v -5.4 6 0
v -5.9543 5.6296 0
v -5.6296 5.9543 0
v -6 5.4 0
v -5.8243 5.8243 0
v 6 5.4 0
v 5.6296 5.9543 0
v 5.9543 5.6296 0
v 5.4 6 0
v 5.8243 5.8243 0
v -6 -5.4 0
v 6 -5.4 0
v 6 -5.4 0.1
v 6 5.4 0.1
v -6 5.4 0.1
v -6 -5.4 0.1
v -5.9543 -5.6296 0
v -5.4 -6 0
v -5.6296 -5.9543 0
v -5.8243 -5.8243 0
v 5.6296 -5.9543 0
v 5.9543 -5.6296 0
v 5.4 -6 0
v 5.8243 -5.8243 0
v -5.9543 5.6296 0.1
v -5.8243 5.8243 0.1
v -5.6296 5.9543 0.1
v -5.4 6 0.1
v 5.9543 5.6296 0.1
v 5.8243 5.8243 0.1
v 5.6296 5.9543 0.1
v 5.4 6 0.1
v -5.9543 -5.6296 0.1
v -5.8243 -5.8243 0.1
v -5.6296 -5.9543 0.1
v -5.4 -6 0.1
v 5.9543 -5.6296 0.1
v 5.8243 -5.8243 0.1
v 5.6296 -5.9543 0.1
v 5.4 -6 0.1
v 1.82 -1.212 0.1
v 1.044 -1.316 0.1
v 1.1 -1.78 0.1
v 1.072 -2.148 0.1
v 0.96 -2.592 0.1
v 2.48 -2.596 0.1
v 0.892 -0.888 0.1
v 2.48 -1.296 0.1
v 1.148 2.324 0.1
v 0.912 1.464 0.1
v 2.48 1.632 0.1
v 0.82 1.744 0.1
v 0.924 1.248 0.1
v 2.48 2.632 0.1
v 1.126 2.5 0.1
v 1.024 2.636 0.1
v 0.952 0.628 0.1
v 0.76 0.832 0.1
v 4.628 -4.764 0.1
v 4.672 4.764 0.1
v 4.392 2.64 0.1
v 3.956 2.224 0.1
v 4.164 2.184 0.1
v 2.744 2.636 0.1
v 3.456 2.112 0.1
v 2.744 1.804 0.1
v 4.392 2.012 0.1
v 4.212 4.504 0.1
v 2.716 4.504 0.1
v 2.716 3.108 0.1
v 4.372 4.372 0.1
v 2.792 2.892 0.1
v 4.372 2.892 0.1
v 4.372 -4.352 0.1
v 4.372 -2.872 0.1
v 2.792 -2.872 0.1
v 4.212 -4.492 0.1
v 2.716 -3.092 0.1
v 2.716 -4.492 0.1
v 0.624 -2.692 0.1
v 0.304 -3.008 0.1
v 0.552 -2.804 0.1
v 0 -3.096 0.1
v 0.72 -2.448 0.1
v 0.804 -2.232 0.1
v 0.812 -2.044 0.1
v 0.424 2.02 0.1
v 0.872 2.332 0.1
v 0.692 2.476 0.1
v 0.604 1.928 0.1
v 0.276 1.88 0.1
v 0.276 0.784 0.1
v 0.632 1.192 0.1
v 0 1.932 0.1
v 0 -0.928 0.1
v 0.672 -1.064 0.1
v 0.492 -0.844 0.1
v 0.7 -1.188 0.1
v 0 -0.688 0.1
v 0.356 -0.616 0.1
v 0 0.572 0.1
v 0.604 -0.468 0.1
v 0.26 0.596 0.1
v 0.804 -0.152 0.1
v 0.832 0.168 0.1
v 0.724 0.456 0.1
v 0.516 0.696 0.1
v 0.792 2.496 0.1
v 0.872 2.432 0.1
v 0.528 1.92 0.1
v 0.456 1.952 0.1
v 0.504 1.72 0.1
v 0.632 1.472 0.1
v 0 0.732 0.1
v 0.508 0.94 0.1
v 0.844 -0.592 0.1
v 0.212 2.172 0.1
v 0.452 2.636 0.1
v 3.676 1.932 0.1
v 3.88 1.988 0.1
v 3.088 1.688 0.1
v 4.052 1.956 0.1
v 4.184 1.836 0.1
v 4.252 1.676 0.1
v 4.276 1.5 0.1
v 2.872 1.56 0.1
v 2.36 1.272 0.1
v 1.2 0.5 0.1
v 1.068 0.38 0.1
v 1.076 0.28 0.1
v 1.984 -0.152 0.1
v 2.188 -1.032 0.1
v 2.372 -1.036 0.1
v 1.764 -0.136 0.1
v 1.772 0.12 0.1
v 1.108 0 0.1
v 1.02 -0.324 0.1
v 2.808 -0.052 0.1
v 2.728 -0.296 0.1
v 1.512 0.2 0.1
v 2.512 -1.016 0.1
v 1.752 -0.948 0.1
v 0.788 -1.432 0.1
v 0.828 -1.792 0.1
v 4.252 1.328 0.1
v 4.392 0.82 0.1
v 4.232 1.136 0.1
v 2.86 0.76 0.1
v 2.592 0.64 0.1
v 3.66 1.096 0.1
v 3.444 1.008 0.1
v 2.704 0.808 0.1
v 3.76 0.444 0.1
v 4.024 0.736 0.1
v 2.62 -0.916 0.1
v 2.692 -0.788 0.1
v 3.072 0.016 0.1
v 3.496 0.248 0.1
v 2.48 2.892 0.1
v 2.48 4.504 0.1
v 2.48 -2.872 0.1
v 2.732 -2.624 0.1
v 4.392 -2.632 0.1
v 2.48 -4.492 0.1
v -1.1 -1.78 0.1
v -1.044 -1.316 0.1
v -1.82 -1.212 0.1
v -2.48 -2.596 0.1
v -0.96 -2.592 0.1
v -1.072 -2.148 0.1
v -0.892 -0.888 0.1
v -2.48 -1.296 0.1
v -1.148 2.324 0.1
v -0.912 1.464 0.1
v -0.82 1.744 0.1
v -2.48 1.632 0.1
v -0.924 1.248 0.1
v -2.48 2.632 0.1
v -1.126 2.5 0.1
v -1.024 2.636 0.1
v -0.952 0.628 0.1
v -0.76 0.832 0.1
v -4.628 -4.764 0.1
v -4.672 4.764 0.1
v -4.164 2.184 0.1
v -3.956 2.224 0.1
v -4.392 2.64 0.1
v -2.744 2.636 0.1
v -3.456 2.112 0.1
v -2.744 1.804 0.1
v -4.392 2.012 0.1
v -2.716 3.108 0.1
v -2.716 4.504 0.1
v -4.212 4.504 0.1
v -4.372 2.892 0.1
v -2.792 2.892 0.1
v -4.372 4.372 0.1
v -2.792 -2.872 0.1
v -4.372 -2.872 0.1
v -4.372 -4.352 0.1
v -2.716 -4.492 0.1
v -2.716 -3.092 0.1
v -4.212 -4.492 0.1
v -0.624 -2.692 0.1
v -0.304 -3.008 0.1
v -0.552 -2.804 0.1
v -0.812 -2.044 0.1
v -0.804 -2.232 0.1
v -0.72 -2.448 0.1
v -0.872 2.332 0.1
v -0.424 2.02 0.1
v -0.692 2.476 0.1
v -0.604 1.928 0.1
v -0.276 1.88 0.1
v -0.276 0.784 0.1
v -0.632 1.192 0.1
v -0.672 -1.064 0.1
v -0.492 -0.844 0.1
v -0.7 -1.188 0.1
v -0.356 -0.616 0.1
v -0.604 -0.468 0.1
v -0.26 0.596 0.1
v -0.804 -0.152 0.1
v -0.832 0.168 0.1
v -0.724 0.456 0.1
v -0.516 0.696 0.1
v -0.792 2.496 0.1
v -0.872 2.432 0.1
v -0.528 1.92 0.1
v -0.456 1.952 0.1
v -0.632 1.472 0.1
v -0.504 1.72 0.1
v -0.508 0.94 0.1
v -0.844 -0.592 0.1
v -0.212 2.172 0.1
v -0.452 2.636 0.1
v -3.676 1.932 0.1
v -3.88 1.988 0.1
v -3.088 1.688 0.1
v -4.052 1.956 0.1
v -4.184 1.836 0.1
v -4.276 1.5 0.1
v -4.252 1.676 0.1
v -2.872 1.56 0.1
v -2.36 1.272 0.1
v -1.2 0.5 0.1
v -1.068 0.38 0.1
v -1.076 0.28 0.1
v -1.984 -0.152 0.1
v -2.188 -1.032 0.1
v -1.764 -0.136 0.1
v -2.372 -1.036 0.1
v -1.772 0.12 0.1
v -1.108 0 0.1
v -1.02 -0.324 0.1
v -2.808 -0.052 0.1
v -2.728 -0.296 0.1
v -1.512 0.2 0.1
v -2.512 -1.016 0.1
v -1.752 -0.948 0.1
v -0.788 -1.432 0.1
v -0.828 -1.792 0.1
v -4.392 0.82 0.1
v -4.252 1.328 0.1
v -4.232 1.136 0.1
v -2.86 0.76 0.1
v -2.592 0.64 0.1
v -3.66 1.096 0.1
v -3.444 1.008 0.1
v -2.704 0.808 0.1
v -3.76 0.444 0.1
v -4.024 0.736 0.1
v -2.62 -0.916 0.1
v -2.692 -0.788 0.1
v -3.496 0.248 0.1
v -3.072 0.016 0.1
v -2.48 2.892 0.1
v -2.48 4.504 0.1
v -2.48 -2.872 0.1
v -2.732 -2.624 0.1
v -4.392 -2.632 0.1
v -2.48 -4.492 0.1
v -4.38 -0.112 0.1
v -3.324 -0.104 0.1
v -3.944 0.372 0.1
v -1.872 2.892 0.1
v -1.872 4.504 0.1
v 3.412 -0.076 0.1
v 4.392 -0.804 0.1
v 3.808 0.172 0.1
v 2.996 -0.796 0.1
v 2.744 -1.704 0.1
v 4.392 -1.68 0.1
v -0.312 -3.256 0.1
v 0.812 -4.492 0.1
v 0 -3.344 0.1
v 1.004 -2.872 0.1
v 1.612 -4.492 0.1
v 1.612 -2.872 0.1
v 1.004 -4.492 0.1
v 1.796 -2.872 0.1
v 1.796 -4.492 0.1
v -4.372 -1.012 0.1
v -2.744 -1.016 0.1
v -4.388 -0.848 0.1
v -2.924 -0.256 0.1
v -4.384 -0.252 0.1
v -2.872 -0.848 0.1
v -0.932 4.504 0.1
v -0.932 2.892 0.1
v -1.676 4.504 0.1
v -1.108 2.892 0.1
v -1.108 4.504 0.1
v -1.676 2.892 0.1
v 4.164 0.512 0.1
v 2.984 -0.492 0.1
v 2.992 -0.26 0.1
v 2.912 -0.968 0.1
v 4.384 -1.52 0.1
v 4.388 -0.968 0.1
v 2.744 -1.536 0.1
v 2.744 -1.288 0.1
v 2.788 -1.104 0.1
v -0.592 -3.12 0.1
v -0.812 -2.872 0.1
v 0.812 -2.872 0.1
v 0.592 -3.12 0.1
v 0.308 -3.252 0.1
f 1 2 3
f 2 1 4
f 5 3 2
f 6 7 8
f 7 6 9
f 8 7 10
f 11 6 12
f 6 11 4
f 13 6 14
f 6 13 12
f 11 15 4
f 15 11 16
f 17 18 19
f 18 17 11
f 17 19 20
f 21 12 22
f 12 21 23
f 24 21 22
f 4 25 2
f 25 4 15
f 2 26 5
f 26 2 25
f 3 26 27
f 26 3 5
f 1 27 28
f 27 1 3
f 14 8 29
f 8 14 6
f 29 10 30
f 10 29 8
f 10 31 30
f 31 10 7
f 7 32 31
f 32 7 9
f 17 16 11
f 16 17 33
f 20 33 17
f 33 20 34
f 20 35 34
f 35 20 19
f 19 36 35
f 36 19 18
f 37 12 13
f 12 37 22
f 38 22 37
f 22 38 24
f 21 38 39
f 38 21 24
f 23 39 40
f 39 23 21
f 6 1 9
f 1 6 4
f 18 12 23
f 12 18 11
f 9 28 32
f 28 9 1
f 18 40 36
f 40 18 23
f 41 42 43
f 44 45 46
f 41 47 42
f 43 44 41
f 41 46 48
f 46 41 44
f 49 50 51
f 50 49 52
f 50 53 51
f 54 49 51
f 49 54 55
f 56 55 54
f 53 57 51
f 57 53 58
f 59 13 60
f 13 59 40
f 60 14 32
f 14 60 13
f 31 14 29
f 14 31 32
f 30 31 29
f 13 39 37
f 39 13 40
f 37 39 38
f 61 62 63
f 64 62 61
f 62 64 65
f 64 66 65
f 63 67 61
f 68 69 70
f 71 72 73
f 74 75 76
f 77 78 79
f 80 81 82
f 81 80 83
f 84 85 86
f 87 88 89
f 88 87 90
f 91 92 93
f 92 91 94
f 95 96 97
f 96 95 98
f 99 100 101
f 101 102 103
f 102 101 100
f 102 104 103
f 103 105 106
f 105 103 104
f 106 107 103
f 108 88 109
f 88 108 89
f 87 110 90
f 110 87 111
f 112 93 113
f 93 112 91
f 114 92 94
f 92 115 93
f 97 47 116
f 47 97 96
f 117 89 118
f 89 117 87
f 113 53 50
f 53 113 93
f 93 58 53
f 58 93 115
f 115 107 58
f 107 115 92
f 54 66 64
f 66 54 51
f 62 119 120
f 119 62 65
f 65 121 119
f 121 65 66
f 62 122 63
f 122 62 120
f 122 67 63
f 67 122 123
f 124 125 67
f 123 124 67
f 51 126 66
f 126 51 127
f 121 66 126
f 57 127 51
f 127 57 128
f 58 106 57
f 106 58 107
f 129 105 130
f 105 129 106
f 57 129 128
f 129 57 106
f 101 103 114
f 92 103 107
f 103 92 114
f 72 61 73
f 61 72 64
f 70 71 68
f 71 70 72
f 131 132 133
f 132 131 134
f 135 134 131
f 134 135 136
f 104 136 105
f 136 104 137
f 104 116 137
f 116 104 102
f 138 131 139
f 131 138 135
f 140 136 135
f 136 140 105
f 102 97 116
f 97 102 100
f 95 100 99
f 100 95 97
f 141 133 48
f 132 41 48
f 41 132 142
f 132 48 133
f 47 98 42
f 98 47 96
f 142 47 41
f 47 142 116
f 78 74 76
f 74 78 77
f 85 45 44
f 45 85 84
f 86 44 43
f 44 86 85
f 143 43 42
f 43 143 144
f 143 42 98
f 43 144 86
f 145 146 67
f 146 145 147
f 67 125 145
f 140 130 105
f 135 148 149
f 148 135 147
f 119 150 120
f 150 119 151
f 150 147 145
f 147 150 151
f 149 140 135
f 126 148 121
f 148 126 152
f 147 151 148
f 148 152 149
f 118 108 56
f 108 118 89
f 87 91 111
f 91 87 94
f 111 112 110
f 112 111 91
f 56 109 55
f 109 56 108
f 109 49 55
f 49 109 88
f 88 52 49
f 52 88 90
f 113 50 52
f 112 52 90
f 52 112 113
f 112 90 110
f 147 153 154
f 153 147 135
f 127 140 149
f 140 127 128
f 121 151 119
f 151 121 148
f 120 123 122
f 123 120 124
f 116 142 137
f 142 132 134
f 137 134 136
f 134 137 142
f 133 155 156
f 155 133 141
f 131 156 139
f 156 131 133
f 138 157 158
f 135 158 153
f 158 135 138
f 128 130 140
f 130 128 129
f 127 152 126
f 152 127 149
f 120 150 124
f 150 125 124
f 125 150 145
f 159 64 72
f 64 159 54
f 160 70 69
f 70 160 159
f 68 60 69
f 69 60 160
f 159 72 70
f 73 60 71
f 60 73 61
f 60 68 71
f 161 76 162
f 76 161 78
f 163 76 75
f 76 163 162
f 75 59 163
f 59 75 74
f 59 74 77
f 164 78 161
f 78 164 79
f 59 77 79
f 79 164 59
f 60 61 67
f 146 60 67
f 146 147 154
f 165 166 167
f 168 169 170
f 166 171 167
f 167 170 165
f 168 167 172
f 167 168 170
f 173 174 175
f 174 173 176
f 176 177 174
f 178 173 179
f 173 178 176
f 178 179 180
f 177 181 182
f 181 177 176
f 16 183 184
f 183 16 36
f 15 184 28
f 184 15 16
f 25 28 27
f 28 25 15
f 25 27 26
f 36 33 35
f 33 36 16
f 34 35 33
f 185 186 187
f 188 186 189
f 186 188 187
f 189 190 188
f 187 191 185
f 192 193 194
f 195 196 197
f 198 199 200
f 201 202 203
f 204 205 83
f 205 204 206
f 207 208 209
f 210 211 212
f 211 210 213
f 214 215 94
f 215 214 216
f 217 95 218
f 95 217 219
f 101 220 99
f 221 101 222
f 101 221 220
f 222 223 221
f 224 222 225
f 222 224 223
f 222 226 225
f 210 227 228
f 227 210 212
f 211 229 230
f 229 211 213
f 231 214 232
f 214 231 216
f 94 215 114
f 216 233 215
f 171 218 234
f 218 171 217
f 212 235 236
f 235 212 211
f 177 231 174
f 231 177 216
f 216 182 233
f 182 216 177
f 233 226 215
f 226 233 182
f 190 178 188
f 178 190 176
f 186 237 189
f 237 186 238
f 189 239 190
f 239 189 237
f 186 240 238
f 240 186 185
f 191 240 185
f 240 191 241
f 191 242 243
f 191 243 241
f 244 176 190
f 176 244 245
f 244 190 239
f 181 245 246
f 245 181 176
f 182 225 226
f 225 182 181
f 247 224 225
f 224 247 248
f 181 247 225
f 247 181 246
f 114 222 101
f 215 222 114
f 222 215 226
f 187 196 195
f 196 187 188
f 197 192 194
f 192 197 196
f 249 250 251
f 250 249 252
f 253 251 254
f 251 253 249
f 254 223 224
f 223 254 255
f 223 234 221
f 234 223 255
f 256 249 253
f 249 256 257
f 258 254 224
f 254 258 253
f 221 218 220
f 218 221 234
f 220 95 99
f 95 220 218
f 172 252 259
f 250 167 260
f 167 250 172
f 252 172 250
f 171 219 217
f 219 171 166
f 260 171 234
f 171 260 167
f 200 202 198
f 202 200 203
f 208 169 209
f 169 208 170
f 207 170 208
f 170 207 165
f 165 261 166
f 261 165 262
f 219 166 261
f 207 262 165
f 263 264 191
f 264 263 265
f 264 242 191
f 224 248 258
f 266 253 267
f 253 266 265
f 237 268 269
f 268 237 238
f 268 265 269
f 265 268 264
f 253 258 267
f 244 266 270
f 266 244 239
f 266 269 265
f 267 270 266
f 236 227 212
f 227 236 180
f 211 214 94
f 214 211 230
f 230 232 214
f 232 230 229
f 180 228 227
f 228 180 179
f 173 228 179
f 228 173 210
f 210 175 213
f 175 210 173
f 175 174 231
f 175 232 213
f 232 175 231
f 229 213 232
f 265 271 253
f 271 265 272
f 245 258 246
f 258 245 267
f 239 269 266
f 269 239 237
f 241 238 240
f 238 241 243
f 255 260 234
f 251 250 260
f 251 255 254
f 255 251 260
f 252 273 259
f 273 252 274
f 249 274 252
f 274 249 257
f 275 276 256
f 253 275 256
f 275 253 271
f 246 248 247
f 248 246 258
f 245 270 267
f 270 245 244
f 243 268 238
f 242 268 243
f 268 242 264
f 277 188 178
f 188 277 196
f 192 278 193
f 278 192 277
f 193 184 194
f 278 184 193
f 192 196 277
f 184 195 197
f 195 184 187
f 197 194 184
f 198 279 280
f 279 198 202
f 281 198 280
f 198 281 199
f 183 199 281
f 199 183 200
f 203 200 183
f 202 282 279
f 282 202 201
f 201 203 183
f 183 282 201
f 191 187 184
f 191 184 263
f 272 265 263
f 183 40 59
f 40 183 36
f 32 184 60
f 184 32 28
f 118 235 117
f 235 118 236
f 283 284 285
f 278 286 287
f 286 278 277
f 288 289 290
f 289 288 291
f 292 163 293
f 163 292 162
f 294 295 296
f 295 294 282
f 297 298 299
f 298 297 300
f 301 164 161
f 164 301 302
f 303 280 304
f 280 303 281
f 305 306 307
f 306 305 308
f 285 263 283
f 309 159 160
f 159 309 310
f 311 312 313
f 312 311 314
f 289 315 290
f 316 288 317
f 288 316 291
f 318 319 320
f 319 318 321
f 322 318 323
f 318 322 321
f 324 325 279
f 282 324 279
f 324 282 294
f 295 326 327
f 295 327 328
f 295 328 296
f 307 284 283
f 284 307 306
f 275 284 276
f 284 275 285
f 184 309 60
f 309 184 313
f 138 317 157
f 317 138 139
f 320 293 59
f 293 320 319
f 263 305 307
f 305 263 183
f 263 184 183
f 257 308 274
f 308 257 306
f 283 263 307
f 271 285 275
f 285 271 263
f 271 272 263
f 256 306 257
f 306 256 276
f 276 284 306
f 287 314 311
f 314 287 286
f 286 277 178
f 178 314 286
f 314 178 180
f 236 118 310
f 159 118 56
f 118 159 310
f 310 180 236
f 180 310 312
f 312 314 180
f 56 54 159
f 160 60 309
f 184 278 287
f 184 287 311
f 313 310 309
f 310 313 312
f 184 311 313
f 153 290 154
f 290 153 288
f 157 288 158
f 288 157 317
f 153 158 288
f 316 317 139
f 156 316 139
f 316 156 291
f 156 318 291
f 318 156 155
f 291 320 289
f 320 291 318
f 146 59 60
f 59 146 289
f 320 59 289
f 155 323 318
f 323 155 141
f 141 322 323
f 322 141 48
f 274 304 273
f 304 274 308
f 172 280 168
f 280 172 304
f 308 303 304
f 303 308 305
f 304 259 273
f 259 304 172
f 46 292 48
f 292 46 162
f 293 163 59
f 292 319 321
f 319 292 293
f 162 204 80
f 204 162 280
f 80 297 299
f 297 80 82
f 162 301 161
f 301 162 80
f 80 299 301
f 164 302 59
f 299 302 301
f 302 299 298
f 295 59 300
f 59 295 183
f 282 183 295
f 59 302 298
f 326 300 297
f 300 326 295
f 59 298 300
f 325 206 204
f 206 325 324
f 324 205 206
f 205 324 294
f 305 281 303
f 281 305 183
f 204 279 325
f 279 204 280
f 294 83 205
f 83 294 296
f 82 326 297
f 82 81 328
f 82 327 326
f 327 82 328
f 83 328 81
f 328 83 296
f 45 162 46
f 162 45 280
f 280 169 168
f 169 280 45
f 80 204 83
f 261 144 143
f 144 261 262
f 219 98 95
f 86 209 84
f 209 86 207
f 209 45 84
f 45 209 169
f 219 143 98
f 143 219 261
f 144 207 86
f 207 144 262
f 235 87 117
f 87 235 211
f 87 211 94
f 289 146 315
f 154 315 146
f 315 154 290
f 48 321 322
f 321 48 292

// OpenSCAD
// file: ../p/box3u12.scad
use <../lib.scad>
function ldraw_lib__box3u12() = [
// 0 Box with 3 Parallel Faces without Any Edges
// 0 Name: box3u12.dat
// 0 Author: J.C. Tchang [tchang]
// 0 !LDRAW_ORG Primitive UPDATE 2014-02
// 0 !LICENSE Licensed under CC BY 4.0 : see CAreadme.txt
// 
// 0 BFC CERTIFY CCW
  [0,"BFC","CERTIFY"],
  [0,"BFC","CCW"],
// 
// 0 !HISTORY 2014-12-23 [PTadmin] Official Update 2014-02
// 
// 
// 4 16 -1 1 1 1 1 1 1 1 -1 -1 1 -1
  [4,16,-1,1,1,1,1,1,1,1,-1,-1,1,-1],
// 4 16 -1 1 1 -1 0 1 1 0 1 1 1 1
  [4,16,-1,1,1,-1,0,1,1,0,1,1,1,1],
// 4 16 1 1 -1 1 0 -1 -1 0 -1 -1 1 -1
  [4,16,1,1,-1,1,0,-1,-1,0,-1,-1,1,-1],
];
module ldraw_lib__box3u12(step=0, col=false, unit=2/5, alt=false, line=0.2, solid=!$preview)
    makepoly(ldraw_lib__box3u12(), step=step, col=col, unit=unit, alt=alt, line=line, solid=solid);
ldraw_lib__box3u12(line=0.2);
// file: ../p/1-4cyli.scad
use <../lib.scad>
function ldraw_lib__1_4cyli() = [
// 0 Cylinder 0.25
// 0 Name: 1-4cyli.dat
// 0 Author: James Jessiman
// 0 !LDRAW_ORG Primitive UPDATE 2012-01
// 0 !LICENSE Licensed under CC BY 4.0 : see CAreadme.txt
// 
// 0 BFC CERTIFY CCW
  [0,"BFC","CERTIFY"],
  [0,"BFC","CCW"],
// 
// 0 !HISTORY 2002-03-23 [sbliss] Added BFC statement.
// 0 !HISTORY 2002-04-25 [PTadmin] Official Update 2002-02
// 0 !HISTORY 2007-06-22 [PTadmin] Header formatted for Contributor Agreement
// 0 !HISTORY 2008-07-01 [PTadmin] Official Update 2008-01
// 0 !HISTORY 2012-02-16 [Philo] Changed to CCW
// 0 !HISTORY 2012-03-30 [PTadmin] Official Update 2012-01
// 
// 
// 4 16 1 1 0 0.9239 1 0.3827 0.9239 0 0.3827 1 0 0
  [4,16,1,1,0,0.9239,1,0.3827,0.9239,0,0.3827,1,0,0],
// 5 24 1 0 0 1 1 0 0.9239 0 0.3827 1 0 -1
  [5,24,1,0,0,1,1,0,0.9239,0,0.3827,1,0,-1],
// 4 16 0.9239 1 0.3827 0.7071 1 0.7071 0.7071 0 0.7071 0.9239 0 0.3827
  [4,16,0.9239,1,0.3827,0.7071,1,0.7071,0.7071,0,0.7071,0.9239,0,0.3827],
// 5 24 0.9239 0 0.3827 0.9239 1 0.3827 0.7071 0 0.7071 1 0 0
  [5,24,0.9239,0,0.3827,0.9239,1,0.3827,0.7071,0,0.7071,1,0,0],
// 4 16 0.7071 1 0.7071 0.3827 1 0.9239 0.3827 0 0.9239 0.7071 0 0.7071
  [4,16,0.7071,1,0.7071,0.3827,1,0.9239,0.3827,0,0.9239,0.7071,0,0.7071],
// 5 24 0.7071 0 0.7071 0.7071 1 0.7071 0.3827 0 0.9239 0.9239 0 0.3827
  [5,24,0.7071,0,0.7071,0.7071,1,0.7071,0.3827,0,0.9239,0.9239,0,0.3827],
// 4 16 0.3827 1 0.9239 0 1 1 0 0 1 0.3827 0 0.9239
  [4,16,0.3827,1,0.9239,0,1,1,0,0,1,0.3827,0,0.9239],
// 5 24 0.3827 0 0.9239 0.3827 1 0.9239 0 0 1 0.7071 0 0.7071
  [5,24,0.3827,0,0.9239,0.3827,1,0.9239,0,0,1,0.7071,0,0.7071],
// 5 24 0 0 1 0 1 1 0.3827 0 0.9239 -1 0 1
  [5,24,0,0,1,0,1,1,0.3827,0,0.9239,-1,0,1],
];
module ldraw_lib__1_4cyli(step=0, col=false, unit=2/5, alt=false, line=0.2, solid=!$preview)
    makepoly(ldraw_lib__1_4cyli(), step=step, col=col, unit=unit, alt=alt, line=line, solid=solid);
ldraw_lib__1_4cyli(line=0.2);
// file: ../p/1-4chrd.scad
use <../lib.scad>
function ldraw_lib__1_4chrd() = [
// 0 Chord 0.25
// 0 Name: 1-4chrd.dat
// 0 Author: Max Martin Richter [MMR1988]
// 0 !LDRAW_ORG Primitive UPDATE 2023-05
// 0 !LICENSE Licensed under CC BY 4.0 : see CAreadme.txt
// 
// 0 BFC CERTIFY CCW
  [0,"BFC","CERTIFY"],
  [0,"BFC","CCW"],
// 
// 0 !HISTORY 2004-04-22 [PTadmin] Official Update 2004-02
// 0 !HISTORY 2007-10-09 [PTadmin] Header formatted for Contributor Agreement
// 0 !HISTORY 2008-07-01 [PTadmin] Official Update 2008-01
// 0 !HISTORY 2012-08-02 [MMR1988] Re-creation with PrimGen2 and Rectifier
// 0 !HISTORY 2012-08-09 [PTadmin] Official Update 2012-02
// 0 !HISTORY 2023-10-27 [OrionP] Change author to MMR1988 from hafhead
// 0 !HISTORY 2023-10-31 [OrionP] Official Update 2023-05
// 
// 4 16 0.9239 0 0.3827 0.3827 0 0.9239 0 0 1 1 0 0
  [4,16,0.9239,0,0.3827,0.3827,0,0.9239,0,0,1,1,0,0],
// 3 16 0.7071 0 0.7071 0.3827 0 0.9239 0.9239 0 0.3827
  [3,16,0.7071,0,0.7071,0.3827,0,0.9239,0.9239,0,0.3827],
];
module ldraw_lib__1_4chrd(step=0, col=false, unit=2/5, alt=false, line=0.2, solid=!$preview)
    makepoly(ldraw_lib__1_4chrd(), step=step, col=col, unit=unit, alt=alt, line=line, solid=solid);
ldraw_lib__1_4chrd(line=0.2);
// file: s/stickerback015x015.scad
use <../../lib.scad>
use <../../p/1-4chrd.scad>
use <../../p/1-4cyli.scad>
use <../../p/box3u12.scad>
function ldraw_lib__s__stickerback015x015() = [
// 0 ~Sticker Back  1.5 x  1.5
// 0 Name: s\stickerback015x015.dat
// 0 Author: Philippe Hurbain [Philo]
// 0 !LDRAW_ORG Subpart UPDATE 2025-11
// 0 !LICENSE Licensed under CC BY 4.0 : see CAreadme.txt
// 
// 0 BFC CERTIFY CCW
  [0,"BFC","CERTIFY"],
  [0,"BFC","CCW"],
// 
// 0 !HISTORY 2025-11-30 [OrionP] Official Update 2025-11
// 
// 1 16 -13.5 0 13.5 -1.5 0 0 0 -1 0 0 0 1.5 1-4chrd.dat
  [1,16,-13.5,0,13.5,-1.5,0,0,0,-1,0,0,0,1.5, ldraw_lib__1_4chrd()],
// 1 16 13.5 0 13.5 1.5 0 0 0 -1 0 0 0 1.5 1-4chrd.dat
  [1,16,13.5,0,13.5,1.5,0,0,0,-1,0,0,0,1.5, ldraw_lib__1_4chrd()],
// 1 16 0 -.25 0 0 0 15 0 .25 0 13.5 0 0 box3u12.dat
  [1,16,0,-.25,0,0,0,15,0,.25,0,13.5,0,0, ldraw_lib__box3u12()],
// 1 16 -13.5 0 -13.5 -1.5 0 0 0 -1 0 0 0 -1.5 1-4chrd.dat
  [1,16,-13.5,0,-13.5,-1.5,0,0,0,-1,0,0,0,-1.5, ldraw_lib__1_4chrd()],
// 1 16 13.5 0 -13.5 1.5 0 0 0 -1 0 0 0 -1.5 1-4chrd.dat
  [1,16,13.5,0,-13.5,1.5,0,0,0,-1,0,0,0,-1.5, ldraw_lib__1_4chrd()],
// 1 16 -13.5 -.25 13.5 -1.5 0 0 0 .25 0 0 0 1.5 1-4cyli.dat
  [1,16,-13.5,-.25,13.5,-1.5,0,0,0,.25,0,0,0,1.5, ldraw_lib__1_4cyli()],
// 1 16 13.5 -.25 13.5 1.5 0 0 0 .25 0 0 0 1.5 1-4cyli.dat
  [1,16,13.5,-.25,13.5,1.5,0,0,0,.25,0,0,0,1.5, ldraw_lib__1_4cyli()],
// 1 16 -13.5 -.25 -13.5 -1.5 0 0 0 .25 0 0 0 -1.5 1-4cyli.dat
  [1,16,-13.5,-.25,-13.5,-1.5,0,0,0,.25,0,0,0,-1.5, ldraw_lib__1_4cyli()],
// 1 16 13.5 -.25 -13.5 1.5 0 0 0 .25 0 0 0 -1.5 1-4cyli.dat
  [1,16,13.5,-.25,-13.5,1.5,0,0,0,.25,0,0,0,-1.5, ldraw_lib__1_4cyli()],
// 4 16 -13.5 0 15 13.5 0 15 15 0 13.5 -15 0 13.5
  [4,16,-13.5,0,15,13.5,0,15,15,0,13.5,-15,0,13.5],
// 4 16 -13.5 0 -15 -15 0 -13.5 15 0 -13.5 13.5 0 -15
  [4,16,-13.5,0,-15,-15,0,-13.5,15,0,-13.5,13.5,0,-15],
// 4 16 -13.5 -.25 15 13.5 -.25 15 13.5 0 15 -13.5 0 15
  [4,16,-13.5,-.25,15,13.5,-.25,15,13.5,0,15,-13.5,0,15],
// 4 16 13.5 0 -15 13.5 -.25 -15 -13.5 -.25 -15 -13.5 0 -15
  [4,16,13.5,0,-15,13.5,-.25,-15,-13.5,-.25,-15,-13.5,0,-15],
];
module ldraw_lib__s__stickerback015x015(step=0, col=false, unit=2/5, alt=false, line=0.2, solid=!$preview)
    makepoly(ldraw_lib__s__stickerback015x015(), step=step, col=col, unit=unit, alt=alt, line=line, solid=solid);
ldraw_lib__s__stickerback015x015(line=0.2);
// main file
use <../lib.scad>
use <s/6522835as01.scad>
use <s/stickerback015x015.scad>
function ldraw_lib__6522835a() = [
// 0 Sticker  1.5 x  1.5 with Stained Glass Bee
// 0 Name: 6522835a.dat
// 0 Author: Philippe Hurbain [Philo]
// 0 !LDRAW_ORG Part UPDATE 2025-11
// 0 !LICENSE Licensed under CC BY 4.0 : see CAreadme.txt
// 
// 0 BFC CERTIFY CCW
  [0,"BFC","CERTIFY"],
  [0,"BFC","CCW"],
// 
// 0 !KEYWORDS Beekeepers' House and Flower Garden, BrickLink 42669stk02
// 0 !KEYWORDS Brickowl 198342, Friends, Rebrickable 10110732, Set 42669, Window
// 
// 0 !HISTORY 2025-11-30 [OrionP] Official Update 2025-11
// 
// 1 16 0 0 0 1 0 0 0 1 0 0 0 1 s\stickerback015x015.dat
  [1,16,0,0,0,1,0,0,0,1,0,0,0,1, ldraw_lib__s__stickerback015x015()],
// 1 16 0 0 0 1 0 0 0 1 0 0 0 1 s\6522835as01.dat
  [1,16,0,0,0,1,0,0,0,1,0,0,0,1, ldraw_lib__s__6522835as01()],
// 1 16 0 0 0 -1 0 0 0 1 0 0 0 1 s\6522835as01.dat
  [1,16,0,0,0,-1,0,0,0,1,0,0,0,1, ldraw_lib__s__6522835as01()],
// 4 16 11.57 -.25 -11.91 -11.57 -.25 -11.91 -13.5 -.25 -15 13.5 -.25 -15
  [4,16,11.57,-.25,-11.91,-11.57,-.25,-11.91,-13.5,-.25,-15,13.5,-.25,-15],
// 4 16 -11.68 -.25 11.91 11.68 -.25 11.91 13.5 -.25 15 -13.5 -.25 15
  [4,16,-11.68,-.25,11.91,11.68,-.25,11.91,13.5,-.25,15,-13.5,-.25,15],
// 4 16 1.13 -.25 6.59 -1.13 -.25 6.59 -.53 -.25 5.43 .53 -.25 5.43
  [4,16,1.13,-.25,6.59,-1.13,-.25,6.59,-.53,-.25,5.43,.53,-.25,5.43],
// 0 BFC NOCLIP
  [0,"BFC","NOCLIP"],
// 3 11019 -10.95 -.25 -.28 -8.31 -.25 -.26 -9.86 -.25 .93
  [3,11019,-10.95,-.25,-.28,-8.31,-.25,-.26,-9.86,-.25,.93],
// 4 11019 -6.2 -.25 7.23 -4.68 -.25 7.23 -4.68 -.25 11.26 -6.2 -.25 11.26
  [4,11019,-6.2,-.25,7.23,-4.68,-.25,7.23,-4.68,-.25,11.26,-6.2,-.25,11.26],
// 4 46 10.98 -.25 -2.01 9.52 -.25 .43 8.53 -.25 -.19 7.49 -.25 -1.99
  [4,46,10.98,-.25,-2.01,9.52,-.25,.43,8.53,-.25,-.19,7.49,-.25,-1.99],
// 4 11019 10.98 -.25 -6.58 10.98 -.25 -4.2 6.86 -.25 -4.26 6.83 -.25 -6.56
  [4,11019,10.98,-.25,-6.58,10.98,-.25,-4.2,6.86,-.25,-4.26,6.83,-.25,-6.56],
// 4 11019 2.03 -.25 -11.23 0 -.25 -8.36 -.78 -.25 -8.14 -6.2 -.25 -11.23
  [4,11019,2.03,-.25,-11.23,0,-.25,-8.36,-.78,-.25,-8.14,-6.2,-.25,-11.23],
// 4 11019 2.51 -.25 -11.23 4.03 -.25 -11.23 4.03 -.25 -7.18 2.51 -.25 -7.18
  [4,11019,2.51,-.25,-11.23,4.03,-.25,-11.23,4.03,-.25,-7.18,2.51,-.25,-7.18],
// 4 11019 4.49 -.25 -7.18 4.49 -.25 -11.23 6.2 -.25 -11.23 6.2 -.25 -7.18
  [4,11019,4.49,-.25,-7.18,4.49,-.25,-11.23,6.2,-.25,-11.23,6.2,-.25,-7.18],
// 4 11019 -6.86 -.25 -2.54 -10.93 -.25 -2.53 -10.98 -.25 -6.58 -6.83 -.25 -6.56
  [4,11019,-6.86,-.25,-2.54,-10.93,-.25,-2.53,-10.98,-.25,-6.58,-6.83,-.25,-6.56],
// 4 11019 -7.31 -.25 -.64 -10.96 -.25 -.63 -10.97 -.25 -2.12 -7.18 -.25 -2.12
  [4,11019,-7.31,-.25,-.64,-10.96,-.25,-.63,-10.97,-.25,-2.12,-7.18,-.25,-2.12],
// 3 11019 -9.86 -.25 .93 -10.98 -.25 2.05 -10.95 -.25 -.28
  [3,11019,-9.86,-.25,.93,-10.98,-.25,2.05,-10.95,-.25,-.28],
// 4 11019 6.2 -.25 7.23 6.2 -.25 11.26 -2.33 -.25 11.26 -2.33 -.25 7.23
  [4,11019,6.2,-.25,7.23,6.2,-.25,11.26,-2.33,-.25,11.26,-2.33,-.25,7.23],
// 4 11019 -4.19 -.25 7.23 -2.77 -.25 7.23 -2.77 -.25 11.26 -4.19 -.25 11.26
  [4,11019,-4.19,-.25,7.23,-2.77,-.25,7.23,-2.77,-.25,11.26,-4.19,-.25,11.26],
// 3 46 10.98 -.25 -2.01 10.41 -.25 1.28 9.52 -.25 .43
  [3,46,10.98,-.25,-2.01,10.41,-.25,1.28,9.52,-.25,.43],
// 4 46 8.53 -.25 -.19 7.48 -.25 -.65 7.46 -.25 -1.23 7.49 -.25 -1.99
  [4,46,8.53,-.25,-.19,7.48,-.25,-.65,7.46,-.25,-1.23,7.49,-.25,-1.99],
// 4 46 7.28 -.25 -2.42 6.86 -.25 -3.84 10.96 -.25 -3.8 10.97 -.25 -2.42
  [4,46,7.28,-.25,-2.42,6.86,-.25,-3.84,10.96,-.25,-3.8,10.97,-.25,-2.42],
// 4 46 6.86 -.25 -3.22 6.86 -.25 -3.84 7.28 -.25 -2.42 6.97 -.25 -2.76
  [4,46,6.86,-.25,-3.22,6.86,-.25,-3.84,7.28,-.25,-2.42,6.97,-.25,-2.76],
// 3 11019 -1.48 -.25 -7.8 -2.03 -.25 -7.18 -6.2 -.25 -7.18
  [3,11019,-1.48,-.25,-7.8,-2.03,-.25,-7.18,-6.2,-.25,-7.18],
// 4 11019 -6.2 -.25 -7.18 -6.2 -.25 -11.23 -.78 -.25 -8.14 -1.48 -.25 -7.8
  [4,11019,-6.2,-.25,-7.18,-6.2,-.25,-11.23,-.78,-.25,-8.14,-1.48,-.25,-7.8],
// 3 11019 2.03 -.25 -11.23 2.03 -.25 -7.18 1.48 -.25 -7.8
  [3,11019,2.03,-.25,-11.23,2.03,-.25,-7.18,1.48,-.25,-7.8],
// 3 11019 2.03 -.25 -11.23 1.48 -.25 -7.8 .77 -.25 -8.13
  [3,11019,2.03,-.25,-11.23,1.48,-.25,-7.8,.77,-.25,-8.13],
// 3 11019 2.03 -.25 -11.23 .77 -.25 -8.13 0 -.25 -8.36
  [3,11019,2.03,-.25,-11.23,.77,-.25,-8.13,0,-.25,-8.36],
// 4 272 -10.96 -.25 -.63 -7.31 -.25 -.64 -8.31 -.25 -.26 -10.95 -.25 -.28
  [4,272,-10.96,-.25,-.63,-7.31,-.25,-.64,-8.31,-.25,-.26,-10.95,-.25,-.28],
// 4 272 -8.74 -.25 .62 -9.86 -.25 .93 -8.31 -.25 -.26 -7.68 -.25 .04
  [4,272,-8.74,-.25,.62,-9.86,-.25,.93,-8.31,-.25,-.26,-7.68,-.25,.04],
// 4 272 -11.68 -.25 11.91 -2.77 -.25 11.26 -2.33 -.25 11.26 11.68 -.25 11.91
  [4,272,-11.68,-.25,11.91,-2.77,-.25,11.26,-2.33,-.25,11.26,11.68,-.25,11.91],
// 4 272 7.02 -.25 -.13 6.82 -.25 -.74 7.48 -.25 -.65 7.68 -.25 .04
  [4,272,7.02,-.25,-.13,6.82,-.25,-.74,7.48,-.25,-.65,7.68,-.25,.04],
// 4 272 10.97 -.25 -2.42 10.96 -.25 -3.8 10.98 -.25 -4.2 11.57 -.25 -11.91
  [4,272,10.97,-.25,-2.42,10.96,-.25,-3.8,10.98,-.25,-4.2,11.57,-.25,-11.91],
// 4 272 -10.97 -.25 -2.12 -10.96 -.25 -.63 -10.98 -.25 2.05 -11.57 -.25 -11.91
  [4,272,-10.97,-.25,-2.12,-10.96,-.25,-.63,-10.98,-.25,2.05,-11.57,-.25,-11.91],
// 3 272 -10.98 -.25 2.05 -11.68 -.25 11.91 -11.57 -.25 -11.91
  [3,272,-10.98,-.25,2.05,-11.68,-.25,11.91,-11.57,-.25,-11.91],
// 4 272 -6.82 -.25 -.74 -7.31 -.25 -.64 -7.18 -.25 -2.12 -6.73 -.25 -1.97
  [4,272,-6.82,-.25,-.74,-7.31,-.25,-.64,-7.18,-.25,-2.12,-6.73,-.25,-1.97],
// 3 272 -10.95 -.25 -.28 -10.98 -.25 2.05 -10.96 -.25 -.63
  [3,272,-10.95,-.25,-.28,-10.98,-.25,2.05,-10.96,-.25,-.63],
// 4 272 -8.74 -.25 .62 -9.4 -.25 1.11 -10.98 -.25 2.05 -9.86 -.25 .93
  [4,272,-8.74,-.25,.62,-9.4,-.25,1.11,-10.98,-.25,2.05,-9.86,-.25,.93],
// 3 272 -9.4 -.25 1.11 -10.06 -.25 1.84 -10.98 -.25 2.05
  [3,272,-9.4,-.25,1.11,-10.06,-.25,1.84,-10.98,-.25,2.05],
// 4 272 -6.82 -.25 -.74 -7.02 -.25 -.13 -7.68 -.25 .04 -7.31 -.25 -.64
  [4,272,-6.82,-.25,-.74,-7.02,-.25,-.13,-7.68,-.25,.04,-7.31,-.25,-.64],
// 3 272 -7.68 -.25 .04 -8.31 -.25 -.26 -7.31 -.25 -.64
  [3,272,-7.68,-.25,.04,-8.31,-.25,-.26,-7.31,-.25,-.64],
// 4 272 -4.68 -.25 11.26 -4.68 -.25 7.23 -4.19 -.25 7.23 -4.19 -.25 11.26
  [4,272,-4.68,-.25,11.26,-4.68,-.25,7.23,-4.19,-.25,7.23,-4.19,-.25,11.26],
// 3 272 -4.68 -.25 7.23 -6.2 -.25 7.23 -6.2 -.25 6.58
  [3,272,-4.68,-.25,7.23,-6.2,-.25,7.23,-6.2,-.25,6.58],
// 4 272 -4.19 -.25 7.23 -4.68 -.25 7.23 -6.2 -.25 6.58 -2.56 -.25 6.59
  [4,272,-4.19,-.25,7.23,-4.68,-.25,7.23,-6.2,-.25,6.58,-2.56,-.25,6.59],
// 3 272 -1.13 -.25 6.59 1.13 -.25 6.59 -2.33 -.25 7.23
  [3,272,-1.13,-.25,6.59,1.13,-.25,6.59,-2.33,-.25,7.23],
// 4 272 2.56 -.25 6.59 6.2 -.25 7.23 -2.33 -.25 7.23 1.13 -.25 6.59
  [4,272,2.56,-.25,6.59,6.2,-.25,7.23,-2.33,-.25,7.23,1.13,-.25,6.59],
// 4 272 -2.56 -.25 6.59 -1.13 -.25 6.59 -2.33 -.25 7.23 -2.77 -.25 7.23
  [4,272,-2.56,-.25,6.59,-1.13,-.25,6.59,-2.33,-.25,7.23,-2.77,-.25,7.23],
// 3 272 -2.77 -.25 7.23 -4.19 -.25 7.23 -2.56 -.25 6.59
  [3,272,-2.77,-.25,7.23,-4.19,-.25,7.23,-2.56,-.25,6.59],
// 3 272 2.56 -.25 6.59 6.2 -.25 6.58 6.2 -.25 7.23
  [3,272,2.56,-.25,6.59,6.2,-.25,6.58,6.2,-.25,7.23],
// 3 272 6.2 -.25 11.26 11.68 -.25 11.91 -2.33 -.25 11.26
  [3,272,6.2,-.25,11.26,11.68,-.25,11.91,-2.33,-.25,11.26],
// 3 272 -11.68 -.25 11.91 -6.2 -.25 11.26 -4.68 -.25 11.26
  [3,272,-11.68,-.25,11.91,-6.2,-.25,11.26,-4.68,-.25,11.26],
// 3 272 -11.68 -.25 11.91 -4.68 -.25 11.26 -4.19 -.25 11.26
  [3,272,-11.68,-.25,11.91,-4.68,-.25,11.26,-4.19,-.25,11.26],
// 4 272 -2.33 -.25 7.23 -2.33 -.25 11.26 -2.77 -.25 11.26 -2.77 -.25 7.23
  [4,272,-2.33,-.25,7.23,-2.33,-.25,11.26,-2.77,-.25,11.26,-2.77,-.25,7.23],
// 3 272 -11.68 -.25 11.91 -4.19 -.25 11.26 -2.77 -.25 11.26
  [3,272,-11.68,-.25,11.91,-4.19,-.25,11.26,-2.77,-.25,11.26],
// 4 272 8.53 -.25 -.19 9.52 -.25 .43 10.06 -.25 1.84 9.4 -.25 1.11
  [4,272,8.53,-.25,-.19,9.52,-.25,.43,10.06,-.25,1.84,9.4,-.25,1.11],
// 4 272 8.53 -.25 -.19 8.74 -.25 .62 7.68 -.25 .04 7.48 -.25 -.65
  [4,272,8.53,-.25,-.19,8.74,-.25,.62,7.68,-.25,.04,7.48,-.25,-.65],
// 3 272 9.4 -.25 1.11 8.74 -.25 .62 8.53 -.25 -.19
  [3,272,9.4,-.25,1.11,8.74,-.25,.62,8.53,-.25,-.19],
// 3 272 7.46 -.25 -1.23 7.48 -.25 -.65 6.82 -.25 -.74
  [3,272,7.46,-.25,-1.23,7.48,-.25,-.65,6.82,-.25,-.74],
// 4 272 7.46 -.25 -1.23 6.82 -.25 -.74 6.73 -.25 -1.97 7.49 -.25 -1.99
  [4,272,7.46,-.25,-1.23,6.82,-.25,-.74,6.73,-.25,-1.97,7.49,-.25,-1.99],
// 4 272 6.73 -.25 -1.97 6.55 -.25 -2.29 7.28 -.25 -2.42 7.49 -.25 -1.99
  [4,272,6.73,-.25,-1.97,6.55,-.25,-2.29,7.28,-.25,-2.42,7.49,-.25,-1.99],
// 4 272 10.97 -.25 -2.42 10.98 -.25 -2.01 7.49 -.25 -1.99 7.28 -.25 -2.42
  [4,272,10.97,-.25,-2.42,10.98,-.25,-2.01,7.49,-.25,-1.99,7.28,-.25,-2.42],
// 4 272 10.98 -.25 -2.01 11.57 -.25 -11.91 11.68 -.25 11.91 10.98 -.25 2.05
  [4,272,10.98,-.25,-2.01,11.57,-.25,-11.91,11.68,-.25,11.91,10.98,-.25,2.05],
// 3 272 10.97 -.25 -2.42 11.57 -.25 -11.91 10.98 -.25 -2.01
  [3,272,10.97,-.25,-2.42,11.57,-.25,-11.91,10.98,-.25,-2.01],
// 4 272 6.97 -.25 -2.76 7.28 -.25 -2.42 6.55 -.25 -2.29 6.28 -.25 -2.54
  [4,272,6.97,-.25,-2.76,7.28,-.25,-2.42,6.55,-.25,-2.29,6.28,-.25,-2.54],
// 4 272 6.86 -.25 -3.22 6.97 -.25 -2.76 6.28 -.25 -2.54 6.2 -.25 -3.24
  [4,272,6.86,-.25,-3.22,6.97,-.25,-2.76,6.28,-.25,-2.54,6.2,-.25,-3.24],
// 4 272 -6.73 -.25 -1.97 -7.18 -.25 -2.12 -6.86 -.25 -2.54 -6.55 -.25 -2.29
  [4,272,-6.73,-.25,-1.97,-7.18,-.25,-2.12,-6.86,-.25,-2.54,-6.55,-.25,-2.29],
// 4 272 -6.83 -.25 -6.56 -6.2 -.25 -6.49 -6.2 -.25 -3.24 -6.86 -.25 -2.54
  [4,272,-6.83,-.25,-6.56,-6.2,-.25,-6.49,-6.2,-.25,-3.24,-6.86,-.25,-2.54],
// 4 272 -7.18 -.25 -2.12 -10.97 -.25 -2.12 -10.93 -.25 -2.53 -6.86 -.25 -2.54
  [4,272,-7.18,-.25,-2.12,-10.97,-.25,-2.12,-10.93,-.25,-2.53,-6.86,-.25,-2.54],
// 4 272 -6.28 -.25 -2.54 -6.55 -.25 -2.29 -6.86 -.25 -2.54 -6.2 -.25 -3.24
  [4,272,-6.28,-.25,-2.54,-6.55,-.25,-2.29,-6.86,-.25,-2.54,-6.2,-.25,-3.24],
// 4 272 6.2 -.25 -6.49 6.83 -.25 -6.56 6.86 -.25 -4.26 6.2 -.25 -3.24
  [4,272,6.2,-.25,-6.49,6.83,-.25,-6.56,6.86,-.25,-4.26,6.2,-.25,-3.24],
// 3 272 10.98 -.25 -4.2 10.98 -.25 -6.58 11.57 -.25 -11.91
  [3,272,10.98,-.25,-4.2,10.98,-.25,-6.58,11.57,-.25,-11.91],
// 4 272 10.96 -.25 -3.8 6.86 -.25 -3.84 6.86 -.25 -4.26 10.98 -.25 -4.2
  [4,272,10.96,-.25,-3.8,6.86,-.25,-3.84,6.86,-.25,-4.26,10.98,-.25,-4.2],
// 4 272 6.83 -.25 -6.56 -6.83 -.25 -6.56 -1.56 -.25 -6.73 1.56 -.25 -6.73
  [4,272,6.83,-.25,-6.56,-6.83,-.25,-6.56,-1.56,-.25,-6.73,1.56,-.25,-6.73],
// 4 272 1.38 -.25 -7.01 2.51 -.25 -7.18 4.03 -.25 -7.18 1.56 -.25 -6.73
  [4,272,1.38,-.25,-7.01,2.51,-.25,-7.18,4.03,-.25,-7.18,1.56,-.25,-6.73],
// 4 272 6.2 -.25 -7.18 6.83 -.25 -6.56 1.56 -.25 -6.73 4.49 -.25 -7.18
  [4,272,6.2,-.25,-7.18,6.83,-.25,-6.56,1.56,-.25,-6.73,4.49,-.25,-7.18],
// 3 272 1.56 -.25 -6.73 4.03 -.25 -7.18 4.49 -.25 -7.18
  [3,272,1.56,-.25,-6.73,4.03,-.25,-7.18,4.49,-.25,-7.18],
// 3 272 6.2 -.25 -11.23 4.49 -.25 -11.23 11.57 -.25 -11.91
  [3,272,6.2,-.25,-11.23,4.49,-.25,-11.23,11.57,-.25,-11.91],
// 4 272 4.03 -.25 -11.23 4.49 -.25 -11.23 4.49 -.25 -7.18 4.03 -.25 -7.18
  [4,272,4.03,-.25,-11.23,4.49,-.25,-11.23,4.49,-.25,-7.18,4.03,-.25,-7.18],
// 4 272 11.57 -.25 -11.91 2.51 -.25 -11.23 2.03 -.25 -11.23 -11.57 -.25 -11.91
  [4,272,11.57,-.25,-11.91,2.51,-.25,-11.23,2.03,-.25,-11.23,-11.57,-.25,-11.91],
// 3 272 -6.2 -.25 -11.23 -11.57 -.25 -11.91 2.03 -.25 -11.23
  [3,272,-6.2,-.25,-11.23,-11.57,-.25,-11.91,2.03,-.25,-11.23],
// 3 272 11.57 -.25 -11.91 4.49 -.25 -11.23 4.03 -.25 -11.23
  [3,272,11.57,-.25,-11.91,4.49,-.25,-11.23,4.03,-.25,-11.23],
// 4 272 2.03 -.25 -11.23 2.51 -.25 -11.23 2.51 -.25 -7.18 2.03 -.25 -7.18
  [4,272,2.03,-.25,-11.23,2.51,-.25,-11.23,2.51,-.25,-7.18,2.03,-.25,-7.18],
// 3 272 11.57 -.25 -11.91 4.03 -.25 -11.23 2.51 -.25 -11.23
  [3,272,11.57,-.25,-11.91,4.03,-.25,-11.23,2.51,-.25,-11.23],
// 4 272 -1.38 -.25 -7.01 -1.56 -.25 -6.73 -2.03 -.25 -7.18 -1.48 -.25 -7.8
  [4,272,-1.38,-.25,-7.01,-1.56,-.25,-6.73,-2.03,-.25,-7.18,-1.48,-.25,-7.8],
// 4 272 -1.48 -.25 -7.8 -.78 -.25 -8.14 -.76 -.25 -7.52 -1.38 -.25 -7.01
  [4,272,-1.48,-.25,-7.8,-.78,-.25,-8.14,-.76,-.25,-7.52,-1.38,-.25,-7.01],
// 4 272 -10.93 -.25 -2.53 -10.97 -.25 -2.12 -11.57 -.25 -11.91 -10.98 -.25 -6.58
  [4,272,-10.93,-.25,-2.53,-10.97,-.25,-2.12,-11.57,-.25,-11.91,-10.98,-.25,-6.58],
// 4 272 -1.56 -.25 -6.73 -6.83 -.25 -6.56 -6.2 -.25 -7.18 -2.03 -.25 -7.18
  [4,272,-1.56,-.25,-6.73,-6.83,-.25,-6.56,-6.2,-.25,-7.18,-2.03,-.25,-7.18],
// 4 272 0 -.25 -7.74 -.76 -.25 -7.52 -.78 -.25 -8.14 0 -.25 -8.36
  [4,272,0,-.25,-7.74,-.76,-.25,-7.52,-.78,-.25,-8.14,0,-.25,-8.36],
// 3 272 1.38 -.25 -7.01 2.03 -.25 -7.18 2.51 -.25 -7.18
  [3,272,1.38,-.25,-7.01,2.03,-.25,-7.18,2.51,-.25,-7.18],
// 3 272 1.38 -.25 -7.01 .76 -.25 -7.52 .77 -.25 -8.13
  [3,272,1.38,-.25,-7.01,.76,-.25,-7.52,.77,-.25,-8.13],
// 4 272 2.03 -.25 -7.18 1.38 -.25 -7.01 .77 -.25 -8.13 1.48 -.25 -7.8
  [4,272,2.03,-.25,-7.18,1.38,-.25,-7.01,.77,-.25,-8.13,1.48,-.25,-7.8],
// 4 272 0 -.25 -7.74 0 -.25 -8.36 .77 -.25 -8.13 .76 -.25 -7.52
  [4,272,0,-.25,-7.74,0,-.25,-8.36,.77,-.25,-8.13,.76,-.25,-7.52],
// 4 272 6.83 -.25 -6.56 6.2 -.25 -6.49 2.4 -.25 -6.48 -6.83 -.25 -6.56
  [4,272,6.83,-.25,-6.56,6.2,-.25,-6.49,2.4,-.25,-6.48,-6.83,-.25,-6.56],
// 4 272 -2.4 -.25 -6.48 -6.2 -.25 -6.49 -6.83 -.25 -6.56 2.4 -.25 -6.48
  [4,272,-2.4,-.25,-6.48,-6.2,-.25,-6.49,-6.83,-.25,-6.56,2.4,-.25,-6.48],
// 3 57 1.56 -.25 -6.73 -1.56 -.25 -6.73 0 -.25 -7.74
  [3,57,1.56,-.25,-6.73,-1.56,-.25,-6.73,0,-.25,-7.74],
// 4 57 1.97 -.25 -3.58 -1.97 -.25 -3.58 -2.07 -.25 -4.48 2.07 -.25 -4.48
  [4,57,1.97,-.25,-3.58,-1.97,-.25,-3.58,-2.07,-.25,-4.48,2.07,-.25,-4.48],
// 3 46 -1.75 -.25 -2.97 1.75 -.25 -2.97 0 -.25 -2.32
  [3,46,-1.75,-.25,-2.97,1.75,-.25,-2.97,0,-.25,-2.32],
// 4 46 1.8 -.25 -6.12 2.03 -.25 -5.11 -2.03 -.25 -5.11 -1.8 -.25 -6.12
  [4,46,1.8,-.25,-6.12,2.03,-.25,-5.11,-2.03,-.25,-5.11,-1.8,-.25,-6.12],
// 4 272 2.4 -.25 -6.48 1.8 -.25 -6.12 -1.8 -.25 -6.12 -2.4 -.25 -6.48
  [4,272,2.4,-.25,-6.48,1.8,-.25,-6.12,-1.8,-.25,-6.12,-2.4,-.25,-6.48],
// 4 272 -1.75 -.25 -2.97 -1.97 -.25 -3.58 1.97 -.25 -3.58 1.75 -.25 -2.97
  [4,272,-1.75,-.25,-2.97,-1.97,-.25,-3.58,1.97,-.25,-3.58,1.75,-.25,-2.97],
// 4 272 2.03 -.25 -5.11 2.07 -.25 -4.48 -2.07 -.25 -4.48 -2.03 -.25 -5.11
  [4,272,2.03,-.25,-5.11,2.07,-.25,-4.48,-2.07,-.25,-4.48,-2.03,-.25,-5.11],
// 4 272 1.06 -.25 5.05 .53 -.25 5.43 -.53 -.25 5.43 -1.06 -.25 5.05
  [4,272,1.06,-.25,5.05,.53,-.25,5.43,-.53,-.25,5.43,-1.06,-.25,5.05],
// 3 272 1.06 -.25 5.05 -1.06 -.25 5.05 0 -.25 4.83
  [3,272,1.06,-.25,5.05,-1.06,-.25,5.05,0,-.25,4.83],
// 3 46 10.98 -.25 -2.01 10.98 -.25 2.05 10.41 -.25 1.28
  [3,46,10.98,-.25,-2.01,10.98,-.25,2.05,10.41,-.25,1.28],
// 4 272 9.52 -.25 .43 10.41 -.25 1.28 10.98 -.25 2.05 10.06 -.25 1.84
  [4,272,9.52,-.25,.43,10.41,-.25,1.28,10.98,-.25,2.05,10.06,-.25,1.84],
// 3 272 6.2 -.25 -3.24 6.86 -.25 -3.84 6.86 -.25 -3.22
  [3,272,6.2,-.25,-3.24,6.86,-.25,-3.84,6.86,-.25,-3.22],
// 3 272 6.86 -.25 -3.84 6.2 -.25 -3.24 6.86 -.25 -4.26
  [3,272,6.86,-.25,-3.84,6.2,-.25,-3.24,6.86,-.25,-4.26],
];
module ldraw_lib__6522835a(step=0, col=false, unit=2/5, alt=false, line=0.2, solid=!$preview)
    makepoly(ldraw_lib__6522835a(), step=step, col=col, unit=unit, alt=alt, line=line, solid=solid);
ldraw_lib__6522835a(line=0.2);
